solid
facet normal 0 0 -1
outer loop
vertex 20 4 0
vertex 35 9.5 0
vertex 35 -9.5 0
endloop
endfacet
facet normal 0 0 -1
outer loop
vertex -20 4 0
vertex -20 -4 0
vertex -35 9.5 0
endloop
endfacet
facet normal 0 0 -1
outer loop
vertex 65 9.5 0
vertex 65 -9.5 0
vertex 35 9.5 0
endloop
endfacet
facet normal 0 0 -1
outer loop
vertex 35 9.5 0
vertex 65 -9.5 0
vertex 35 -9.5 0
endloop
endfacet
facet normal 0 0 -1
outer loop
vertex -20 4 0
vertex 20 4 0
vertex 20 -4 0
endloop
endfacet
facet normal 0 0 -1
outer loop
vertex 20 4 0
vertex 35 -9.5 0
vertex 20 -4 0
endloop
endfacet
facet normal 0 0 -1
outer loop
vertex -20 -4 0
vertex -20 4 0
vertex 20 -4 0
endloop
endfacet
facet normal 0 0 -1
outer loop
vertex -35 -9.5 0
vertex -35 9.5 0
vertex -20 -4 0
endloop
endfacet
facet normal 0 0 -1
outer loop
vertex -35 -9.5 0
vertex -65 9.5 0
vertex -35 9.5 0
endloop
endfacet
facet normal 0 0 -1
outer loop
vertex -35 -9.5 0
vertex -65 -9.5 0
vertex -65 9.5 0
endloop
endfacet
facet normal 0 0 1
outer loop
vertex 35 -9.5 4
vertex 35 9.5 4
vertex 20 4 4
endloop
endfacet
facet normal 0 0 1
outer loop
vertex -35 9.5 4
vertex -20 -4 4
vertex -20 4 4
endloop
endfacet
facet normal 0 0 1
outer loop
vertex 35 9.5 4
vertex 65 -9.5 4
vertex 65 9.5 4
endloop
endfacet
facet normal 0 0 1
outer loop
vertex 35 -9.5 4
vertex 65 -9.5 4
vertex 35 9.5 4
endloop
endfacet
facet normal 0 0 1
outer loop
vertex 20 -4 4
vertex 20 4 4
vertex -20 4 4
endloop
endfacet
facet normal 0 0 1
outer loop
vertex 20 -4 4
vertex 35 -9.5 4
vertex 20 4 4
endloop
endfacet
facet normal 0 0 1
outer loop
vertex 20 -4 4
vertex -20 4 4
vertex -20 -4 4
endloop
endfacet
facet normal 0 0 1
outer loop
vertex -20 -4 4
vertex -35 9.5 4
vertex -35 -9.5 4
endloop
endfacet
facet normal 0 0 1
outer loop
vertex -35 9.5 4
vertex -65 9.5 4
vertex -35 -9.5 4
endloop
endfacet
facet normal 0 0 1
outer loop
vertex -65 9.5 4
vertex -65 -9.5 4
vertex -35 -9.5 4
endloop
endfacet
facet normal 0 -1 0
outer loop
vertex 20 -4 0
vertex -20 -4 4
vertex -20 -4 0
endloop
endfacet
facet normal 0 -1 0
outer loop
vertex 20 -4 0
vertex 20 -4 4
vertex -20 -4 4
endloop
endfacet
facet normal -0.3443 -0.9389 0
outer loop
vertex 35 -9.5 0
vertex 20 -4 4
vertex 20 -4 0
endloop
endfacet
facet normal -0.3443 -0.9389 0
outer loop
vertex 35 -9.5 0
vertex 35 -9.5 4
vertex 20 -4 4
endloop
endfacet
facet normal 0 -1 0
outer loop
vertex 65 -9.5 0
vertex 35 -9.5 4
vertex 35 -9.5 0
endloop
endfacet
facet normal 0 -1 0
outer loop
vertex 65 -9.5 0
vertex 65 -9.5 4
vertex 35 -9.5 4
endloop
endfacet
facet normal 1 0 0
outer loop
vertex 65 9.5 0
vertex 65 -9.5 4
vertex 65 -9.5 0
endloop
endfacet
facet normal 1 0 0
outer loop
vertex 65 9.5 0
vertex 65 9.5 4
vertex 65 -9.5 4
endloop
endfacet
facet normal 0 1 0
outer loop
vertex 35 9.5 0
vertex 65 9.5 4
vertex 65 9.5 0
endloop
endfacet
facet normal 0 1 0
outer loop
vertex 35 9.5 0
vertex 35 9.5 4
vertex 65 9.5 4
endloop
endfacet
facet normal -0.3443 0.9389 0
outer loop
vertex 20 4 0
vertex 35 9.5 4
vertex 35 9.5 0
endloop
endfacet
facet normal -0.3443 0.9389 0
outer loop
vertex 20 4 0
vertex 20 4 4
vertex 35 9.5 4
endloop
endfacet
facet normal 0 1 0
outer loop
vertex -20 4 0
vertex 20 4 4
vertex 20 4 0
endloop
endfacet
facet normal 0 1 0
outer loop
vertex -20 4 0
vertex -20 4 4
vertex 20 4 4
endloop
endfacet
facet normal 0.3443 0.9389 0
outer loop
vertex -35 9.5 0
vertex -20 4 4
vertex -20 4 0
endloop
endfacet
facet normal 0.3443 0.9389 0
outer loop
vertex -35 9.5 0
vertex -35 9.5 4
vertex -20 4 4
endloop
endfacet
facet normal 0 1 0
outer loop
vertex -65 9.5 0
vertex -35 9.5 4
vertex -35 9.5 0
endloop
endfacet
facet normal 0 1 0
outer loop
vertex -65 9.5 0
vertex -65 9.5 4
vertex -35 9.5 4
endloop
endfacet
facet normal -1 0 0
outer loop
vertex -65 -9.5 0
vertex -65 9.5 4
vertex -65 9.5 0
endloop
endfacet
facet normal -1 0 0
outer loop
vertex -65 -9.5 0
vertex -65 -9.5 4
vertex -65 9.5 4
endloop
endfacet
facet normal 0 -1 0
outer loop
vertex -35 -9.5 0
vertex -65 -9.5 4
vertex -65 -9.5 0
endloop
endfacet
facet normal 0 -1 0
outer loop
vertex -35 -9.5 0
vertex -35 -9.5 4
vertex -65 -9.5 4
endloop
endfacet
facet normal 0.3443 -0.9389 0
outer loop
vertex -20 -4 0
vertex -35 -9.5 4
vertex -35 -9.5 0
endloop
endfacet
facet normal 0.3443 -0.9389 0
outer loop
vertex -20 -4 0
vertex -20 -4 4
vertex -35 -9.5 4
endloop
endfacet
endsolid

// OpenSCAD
// Flat tensile test specimen (dog bone), printed flat on the bed
// All dimensions in mm

thickness     = 4;    // specimen thickness (Z)
total_length  = 130;  // overall length (X)
gauge_width   = 8;    // width of narrow gauge section (Y)
gauge_length  = 40;   // length of gauge section (X)
grip_width    = 19;   // width of grip sections (Y)
grip_length   = 30;   // length of each grip section (X)
trans_length  = 15;   // length of each linear transition (X)

// Derived half-dimensions
hg = gauge_length / 2;                 // half gauge length (20)
ht = hg + trans_length;                // end of transition from centre (35)
hl = ht + grip_length;                 // half total length (65) = total_length/2
wg = gauge_width / 2;                  // half gauge width
ww = grip_width / 2;                   // half grip width

// Check that the section lengths add up to the total length
assert(abs(2 * hl - total_length) < 1e-6, "Section lengths do not sum to total length");

linear_extrude(height = thickness)
    polygon(points = [
        [-hl, -ww], [-ht, -ww], [-hg, -wg], [ hg, -wg], [ ht, -ww], [ hl, -ww],
        [ hl,  ww], [ ht,  ww], [ hg,  wg], [-hg,  wg], [-ht,  ww], [-hl,  ww]
    ]);
